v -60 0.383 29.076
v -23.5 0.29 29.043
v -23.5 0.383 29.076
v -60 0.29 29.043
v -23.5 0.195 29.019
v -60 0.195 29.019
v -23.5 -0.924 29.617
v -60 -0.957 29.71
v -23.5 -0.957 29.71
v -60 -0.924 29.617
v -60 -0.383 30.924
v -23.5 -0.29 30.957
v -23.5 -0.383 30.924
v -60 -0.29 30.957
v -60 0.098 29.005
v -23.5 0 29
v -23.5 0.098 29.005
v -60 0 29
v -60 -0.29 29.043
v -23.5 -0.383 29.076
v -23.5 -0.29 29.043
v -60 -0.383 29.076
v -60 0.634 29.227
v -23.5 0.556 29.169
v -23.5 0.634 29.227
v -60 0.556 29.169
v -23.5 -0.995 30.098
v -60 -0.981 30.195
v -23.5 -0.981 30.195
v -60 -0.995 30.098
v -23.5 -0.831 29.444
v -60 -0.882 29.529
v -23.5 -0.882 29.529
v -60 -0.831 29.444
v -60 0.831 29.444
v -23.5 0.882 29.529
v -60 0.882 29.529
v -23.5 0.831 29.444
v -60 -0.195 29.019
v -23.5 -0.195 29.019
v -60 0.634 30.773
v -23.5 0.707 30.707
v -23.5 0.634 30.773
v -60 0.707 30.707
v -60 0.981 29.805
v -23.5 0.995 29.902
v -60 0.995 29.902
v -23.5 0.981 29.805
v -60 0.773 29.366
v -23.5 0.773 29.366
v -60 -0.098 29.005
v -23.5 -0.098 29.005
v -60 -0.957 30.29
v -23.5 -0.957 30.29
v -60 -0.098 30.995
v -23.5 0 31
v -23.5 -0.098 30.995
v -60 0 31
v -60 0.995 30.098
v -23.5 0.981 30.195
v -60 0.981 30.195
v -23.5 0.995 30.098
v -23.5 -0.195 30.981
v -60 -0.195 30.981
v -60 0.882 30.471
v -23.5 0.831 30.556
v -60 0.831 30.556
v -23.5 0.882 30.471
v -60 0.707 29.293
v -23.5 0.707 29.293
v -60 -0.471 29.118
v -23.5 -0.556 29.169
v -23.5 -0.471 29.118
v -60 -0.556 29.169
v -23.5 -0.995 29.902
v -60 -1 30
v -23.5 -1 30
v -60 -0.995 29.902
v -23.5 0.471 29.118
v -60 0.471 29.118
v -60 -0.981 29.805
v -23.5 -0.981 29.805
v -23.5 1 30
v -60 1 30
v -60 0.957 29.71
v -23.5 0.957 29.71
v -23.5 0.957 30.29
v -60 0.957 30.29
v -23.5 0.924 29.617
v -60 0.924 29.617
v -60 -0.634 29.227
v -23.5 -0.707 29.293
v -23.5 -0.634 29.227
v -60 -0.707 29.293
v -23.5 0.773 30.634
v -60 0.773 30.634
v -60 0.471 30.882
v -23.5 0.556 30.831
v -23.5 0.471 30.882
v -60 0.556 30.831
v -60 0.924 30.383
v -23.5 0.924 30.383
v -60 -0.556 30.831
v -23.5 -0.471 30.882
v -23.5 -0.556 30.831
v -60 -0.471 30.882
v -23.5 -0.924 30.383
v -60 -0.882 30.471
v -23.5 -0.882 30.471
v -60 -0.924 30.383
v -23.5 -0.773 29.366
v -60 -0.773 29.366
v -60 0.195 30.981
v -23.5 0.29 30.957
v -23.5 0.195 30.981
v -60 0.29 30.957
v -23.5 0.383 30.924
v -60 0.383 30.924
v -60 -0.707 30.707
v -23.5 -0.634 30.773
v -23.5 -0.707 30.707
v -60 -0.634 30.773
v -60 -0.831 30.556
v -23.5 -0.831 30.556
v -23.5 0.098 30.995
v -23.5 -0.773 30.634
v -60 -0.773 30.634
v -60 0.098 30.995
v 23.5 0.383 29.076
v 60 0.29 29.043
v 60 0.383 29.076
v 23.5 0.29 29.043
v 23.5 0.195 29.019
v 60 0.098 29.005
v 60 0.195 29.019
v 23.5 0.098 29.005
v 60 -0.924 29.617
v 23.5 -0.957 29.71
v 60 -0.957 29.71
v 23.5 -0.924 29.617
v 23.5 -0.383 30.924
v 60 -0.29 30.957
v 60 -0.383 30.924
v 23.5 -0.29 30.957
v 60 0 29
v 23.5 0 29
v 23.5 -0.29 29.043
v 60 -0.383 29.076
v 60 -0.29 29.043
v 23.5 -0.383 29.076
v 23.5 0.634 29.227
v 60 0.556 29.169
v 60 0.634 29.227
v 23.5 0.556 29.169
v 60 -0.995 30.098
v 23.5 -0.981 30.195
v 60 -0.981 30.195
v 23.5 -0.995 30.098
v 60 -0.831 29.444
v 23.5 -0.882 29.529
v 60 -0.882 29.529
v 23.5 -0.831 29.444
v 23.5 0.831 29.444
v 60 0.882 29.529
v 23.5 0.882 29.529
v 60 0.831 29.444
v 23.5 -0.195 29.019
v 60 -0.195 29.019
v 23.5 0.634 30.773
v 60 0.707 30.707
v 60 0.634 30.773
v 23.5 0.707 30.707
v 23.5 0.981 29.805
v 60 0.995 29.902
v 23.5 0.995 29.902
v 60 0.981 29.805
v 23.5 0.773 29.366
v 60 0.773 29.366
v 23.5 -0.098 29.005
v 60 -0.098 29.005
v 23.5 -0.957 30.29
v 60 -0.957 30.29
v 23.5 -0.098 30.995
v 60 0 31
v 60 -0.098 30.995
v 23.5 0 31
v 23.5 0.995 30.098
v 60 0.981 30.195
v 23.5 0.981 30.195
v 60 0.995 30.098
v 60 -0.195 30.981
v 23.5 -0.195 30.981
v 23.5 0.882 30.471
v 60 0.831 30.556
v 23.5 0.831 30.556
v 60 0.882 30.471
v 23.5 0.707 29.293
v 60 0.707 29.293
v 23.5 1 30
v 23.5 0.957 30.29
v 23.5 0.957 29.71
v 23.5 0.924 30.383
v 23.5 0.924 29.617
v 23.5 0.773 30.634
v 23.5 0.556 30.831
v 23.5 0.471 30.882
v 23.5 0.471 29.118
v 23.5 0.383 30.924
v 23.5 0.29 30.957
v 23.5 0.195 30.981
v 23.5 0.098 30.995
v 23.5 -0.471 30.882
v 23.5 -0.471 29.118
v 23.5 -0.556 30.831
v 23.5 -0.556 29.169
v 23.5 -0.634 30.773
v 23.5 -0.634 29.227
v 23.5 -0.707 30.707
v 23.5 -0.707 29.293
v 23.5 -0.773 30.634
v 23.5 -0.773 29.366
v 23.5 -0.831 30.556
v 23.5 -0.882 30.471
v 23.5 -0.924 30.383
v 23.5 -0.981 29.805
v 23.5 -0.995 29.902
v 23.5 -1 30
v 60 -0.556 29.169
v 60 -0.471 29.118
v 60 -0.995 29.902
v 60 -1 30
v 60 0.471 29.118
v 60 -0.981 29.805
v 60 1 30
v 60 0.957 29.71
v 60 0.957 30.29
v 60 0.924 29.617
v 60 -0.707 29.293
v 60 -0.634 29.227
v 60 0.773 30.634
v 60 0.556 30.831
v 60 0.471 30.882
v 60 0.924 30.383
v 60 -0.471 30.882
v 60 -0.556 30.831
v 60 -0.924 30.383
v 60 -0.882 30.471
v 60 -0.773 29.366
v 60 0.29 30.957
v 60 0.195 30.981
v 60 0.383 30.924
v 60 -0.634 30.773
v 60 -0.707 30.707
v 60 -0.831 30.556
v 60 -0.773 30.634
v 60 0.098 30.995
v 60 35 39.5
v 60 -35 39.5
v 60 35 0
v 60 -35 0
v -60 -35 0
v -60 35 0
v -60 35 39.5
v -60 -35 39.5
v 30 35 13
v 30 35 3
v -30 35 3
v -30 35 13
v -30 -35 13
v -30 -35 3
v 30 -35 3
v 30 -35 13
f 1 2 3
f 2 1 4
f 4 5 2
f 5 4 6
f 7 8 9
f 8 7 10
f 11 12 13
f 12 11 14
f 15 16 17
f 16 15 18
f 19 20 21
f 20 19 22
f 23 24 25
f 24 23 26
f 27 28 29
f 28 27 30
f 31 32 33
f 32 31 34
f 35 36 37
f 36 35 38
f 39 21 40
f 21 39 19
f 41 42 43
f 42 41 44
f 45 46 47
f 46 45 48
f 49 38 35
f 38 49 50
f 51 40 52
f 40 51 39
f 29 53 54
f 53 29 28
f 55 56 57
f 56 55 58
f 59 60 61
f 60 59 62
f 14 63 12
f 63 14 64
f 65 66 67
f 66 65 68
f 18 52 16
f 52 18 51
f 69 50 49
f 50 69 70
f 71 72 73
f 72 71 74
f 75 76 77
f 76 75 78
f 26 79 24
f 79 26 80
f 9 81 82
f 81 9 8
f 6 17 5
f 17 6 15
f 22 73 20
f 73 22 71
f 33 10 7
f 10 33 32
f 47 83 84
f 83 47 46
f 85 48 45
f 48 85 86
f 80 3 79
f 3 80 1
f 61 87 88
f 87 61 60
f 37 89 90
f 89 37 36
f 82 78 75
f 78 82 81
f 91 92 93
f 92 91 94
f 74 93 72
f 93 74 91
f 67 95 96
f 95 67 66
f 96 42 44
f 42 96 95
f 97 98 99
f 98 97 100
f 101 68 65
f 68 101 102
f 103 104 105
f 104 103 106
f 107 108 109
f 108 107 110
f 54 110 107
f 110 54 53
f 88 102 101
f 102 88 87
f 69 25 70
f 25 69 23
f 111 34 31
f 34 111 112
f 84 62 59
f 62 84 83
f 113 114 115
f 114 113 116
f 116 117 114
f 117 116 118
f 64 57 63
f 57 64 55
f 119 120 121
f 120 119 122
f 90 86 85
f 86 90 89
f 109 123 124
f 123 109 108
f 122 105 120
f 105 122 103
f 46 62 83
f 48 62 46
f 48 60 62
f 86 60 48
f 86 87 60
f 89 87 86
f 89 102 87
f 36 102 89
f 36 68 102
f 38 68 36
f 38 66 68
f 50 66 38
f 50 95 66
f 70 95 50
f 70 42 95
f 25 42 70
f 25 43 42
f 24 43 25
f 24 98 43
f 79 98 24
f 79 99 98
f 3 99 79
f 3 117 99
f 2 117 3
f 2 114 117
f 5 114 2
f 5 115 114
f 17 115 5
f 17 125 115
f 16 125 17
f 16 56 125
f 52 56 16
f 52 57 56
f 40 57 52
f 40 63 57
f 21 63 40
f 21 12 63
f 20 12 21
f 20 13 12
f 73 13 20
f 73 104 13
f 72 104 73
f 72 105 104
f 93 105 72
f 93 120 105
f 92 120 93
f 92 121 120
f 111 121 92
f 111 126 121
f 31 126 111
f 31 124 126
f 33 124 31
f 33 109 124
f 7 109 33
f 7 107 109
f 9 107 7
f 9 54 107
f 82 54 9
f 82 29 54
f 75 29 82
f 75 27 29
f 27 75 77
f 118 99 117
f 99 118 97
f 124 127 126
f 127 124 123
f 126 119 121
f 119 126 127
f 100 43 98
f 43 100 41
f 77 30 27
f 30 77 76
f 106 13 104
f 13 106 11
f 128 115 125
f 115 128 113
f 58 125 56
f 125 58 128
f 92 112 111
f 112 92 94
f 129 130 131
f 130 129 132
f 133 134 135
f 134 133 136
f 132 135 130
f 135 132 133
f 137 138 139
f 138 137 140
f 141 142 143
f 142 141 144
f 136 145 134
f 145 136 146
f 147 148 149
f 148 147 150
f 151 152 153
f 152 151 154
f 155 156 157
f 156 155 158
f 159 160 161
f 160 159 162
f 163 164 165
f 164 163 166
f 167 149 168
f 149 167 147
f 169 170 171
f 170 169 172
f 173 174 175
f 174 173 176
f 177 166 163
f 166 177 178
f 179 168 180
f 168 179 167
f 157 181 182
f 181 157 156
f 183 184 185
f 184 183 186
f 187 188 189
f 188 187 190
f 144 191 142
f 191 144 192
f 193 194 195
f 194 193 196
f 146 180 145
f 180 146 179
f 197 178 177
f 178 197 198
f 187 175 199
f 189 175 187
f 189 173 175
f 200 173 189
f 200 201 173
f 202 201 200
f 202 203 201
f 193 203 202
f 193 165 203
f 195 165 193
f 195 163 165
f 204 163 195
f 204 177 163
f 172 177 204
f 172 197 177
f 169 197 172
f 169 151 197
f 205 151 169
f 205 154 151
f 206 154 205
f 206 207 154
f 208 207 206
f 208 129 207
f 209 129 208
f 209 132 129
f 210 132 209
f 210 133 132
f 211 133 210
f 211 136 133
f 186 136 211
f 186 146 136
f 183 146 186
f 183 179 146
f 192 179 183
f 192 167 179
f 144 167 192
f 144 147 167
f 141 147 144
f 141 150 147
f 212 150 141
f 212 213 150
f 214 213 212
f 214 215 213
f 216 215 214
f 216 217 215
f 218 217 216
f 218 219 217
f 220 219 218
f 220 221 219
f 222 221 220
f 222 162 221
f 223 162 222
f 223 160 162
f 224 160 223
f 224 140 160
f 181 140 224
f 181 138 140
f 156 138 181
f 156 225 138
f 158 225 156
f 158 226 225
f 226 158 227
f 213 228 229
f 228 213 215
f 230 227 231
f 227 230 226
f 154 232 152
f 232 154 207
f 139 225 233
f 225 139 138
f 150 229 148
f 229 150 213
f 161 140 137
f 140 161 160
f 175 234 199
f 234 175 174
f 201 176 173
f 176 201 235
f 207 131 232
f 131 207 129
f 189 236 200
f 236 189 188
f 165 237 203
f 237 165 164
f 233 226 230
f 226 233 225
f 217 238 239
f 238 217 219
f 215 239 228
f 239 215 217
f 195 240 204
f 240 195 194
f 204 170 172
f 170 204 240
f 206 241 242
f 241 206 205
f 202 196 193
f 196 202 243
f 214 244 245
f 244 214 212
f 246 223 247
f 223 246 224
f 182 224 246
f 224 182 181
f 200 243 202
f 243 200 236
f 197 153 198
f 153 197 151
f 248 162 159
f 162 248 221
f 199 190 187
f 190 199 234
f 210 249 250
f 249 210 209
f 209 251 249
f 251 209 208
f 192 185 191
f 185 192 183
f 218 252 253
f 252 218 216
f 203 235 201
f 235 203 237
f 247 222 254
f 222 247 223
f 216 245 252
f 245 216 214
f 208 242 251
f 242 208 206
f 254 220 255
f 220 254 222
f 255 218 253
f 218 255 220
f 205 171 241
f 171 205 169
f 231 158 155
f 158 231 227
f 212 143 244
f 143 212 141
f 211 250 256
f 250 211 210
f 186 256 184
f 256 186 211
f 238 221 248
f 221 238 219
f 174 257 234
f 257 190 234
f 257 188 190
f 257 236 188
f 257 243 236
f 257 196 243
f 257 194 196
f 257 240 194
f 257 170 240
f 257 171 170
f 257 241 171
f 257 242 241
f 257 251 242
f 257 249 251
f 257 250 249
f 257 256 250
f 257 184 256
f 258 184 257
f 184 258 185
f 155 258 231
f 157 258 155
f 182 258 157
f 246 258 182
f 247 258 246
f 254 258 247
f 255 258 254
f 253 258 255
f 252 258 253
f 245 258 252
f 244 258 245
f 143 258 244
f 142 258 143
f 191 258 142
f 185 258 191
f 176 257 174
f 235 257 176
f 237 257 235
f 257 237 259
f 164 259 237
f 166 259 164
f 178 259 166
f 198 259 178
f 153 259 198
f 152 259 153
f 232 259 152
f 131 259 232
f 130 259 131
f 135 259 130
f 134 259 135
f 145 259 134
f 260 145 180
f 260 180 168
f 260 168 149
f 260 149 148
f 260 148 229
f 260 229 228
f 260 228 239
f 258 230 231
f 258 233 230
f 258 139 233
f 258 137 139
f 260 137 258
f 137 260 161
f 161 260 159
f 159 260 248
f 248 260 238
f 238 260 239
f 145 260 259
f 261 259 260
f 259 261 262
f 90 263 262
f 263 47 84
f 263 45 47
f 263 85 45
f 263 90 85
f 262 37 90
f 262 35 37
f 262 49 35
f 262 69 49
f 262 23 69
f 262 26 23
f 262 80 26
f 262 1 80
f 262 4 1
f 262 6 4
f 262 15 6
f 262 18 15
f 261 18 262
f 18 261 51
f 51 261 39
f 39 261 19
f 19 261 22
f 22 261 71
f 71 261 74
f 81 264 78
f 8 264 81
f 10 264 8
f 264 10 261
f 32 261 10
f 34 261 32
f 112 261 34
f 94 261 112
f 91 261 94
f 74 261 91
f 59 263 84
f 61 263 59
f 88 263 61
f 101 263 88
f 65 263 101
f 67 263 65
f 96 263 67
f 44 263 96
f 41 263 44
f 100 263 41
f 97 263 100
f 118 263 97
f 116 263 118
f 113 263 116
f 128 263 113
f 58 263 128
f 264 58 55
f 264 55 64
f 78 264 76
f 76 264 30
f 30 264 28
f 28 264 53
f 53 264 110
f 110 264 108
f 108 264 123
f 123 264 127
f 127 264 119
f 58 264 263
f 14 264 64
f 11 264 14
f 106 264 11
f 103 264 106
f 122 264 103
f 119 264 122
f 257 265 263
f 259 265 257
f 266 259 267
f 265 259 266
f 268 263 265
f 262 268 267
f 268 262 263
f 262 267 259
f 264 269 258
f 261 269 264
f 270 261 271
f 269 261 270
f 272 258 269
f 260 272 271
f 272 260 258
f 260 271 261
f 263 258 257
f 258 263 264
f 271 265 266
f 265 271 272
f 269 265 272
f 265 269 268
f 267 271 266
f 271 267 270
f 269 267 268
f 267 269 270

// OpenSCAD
// Mini horizontal gel-electrophoresis box - buffer tank
// Print orientation: open top, resting on XY plane at z = 0

$fn = 64;

// ---- Tank ----
tank_x      = 120;   // outer length (X)
tank_y      = 70;    // outer width (Y)
tank_h      = 40;    // outer height (Z)
wall        = 3;     // wall thickness
floor       = 3;     // floor thickness

// ---- Platform ----
plat_x      = 60;    // platform length in X (centred)
plat_top_z  = 13;    // platform top height above outer base

// ---- Electrode holes ----
hole_d      = 2;     // horizontal hole diameter
hole_y      = 0;     // hole Y position
hole_z      = 30;    // hole Z position

// ---- Misc ----
eps         = 0.5;   // cutter overshoot

// Derived
inner_h = tank_h - floor;   // inner floor height (z = 3)
plat_h  = plat_top_z - floor; // platform height above inner floor (10)

difference() {
    // Tank body
    translate([-tank_x/2, -tank_y/2, 0])
        cube([tank_x, tank_y, tank_h]);

    // Open top
    translate([-tank_x/2, -tank_y/2, tank_h - eps])
        cube([tank_x, tank_y, eps]);

    // Raised platform (spans full inner width)
    translate([-plat_x/2, -tank_y/2, floor])
        cube([plat_x, tank_y, plat_h]);

    // Electrode holes through end walls, along X
    for (sx = [-1, 1])
        translate([sx * (tank_x/2 - hole_d/2), hole_y, hole_z])
            rotate([0, 90, 0])
                cylinder(d = hole_d, h = tank_y + 2*eps, center = true);
}
